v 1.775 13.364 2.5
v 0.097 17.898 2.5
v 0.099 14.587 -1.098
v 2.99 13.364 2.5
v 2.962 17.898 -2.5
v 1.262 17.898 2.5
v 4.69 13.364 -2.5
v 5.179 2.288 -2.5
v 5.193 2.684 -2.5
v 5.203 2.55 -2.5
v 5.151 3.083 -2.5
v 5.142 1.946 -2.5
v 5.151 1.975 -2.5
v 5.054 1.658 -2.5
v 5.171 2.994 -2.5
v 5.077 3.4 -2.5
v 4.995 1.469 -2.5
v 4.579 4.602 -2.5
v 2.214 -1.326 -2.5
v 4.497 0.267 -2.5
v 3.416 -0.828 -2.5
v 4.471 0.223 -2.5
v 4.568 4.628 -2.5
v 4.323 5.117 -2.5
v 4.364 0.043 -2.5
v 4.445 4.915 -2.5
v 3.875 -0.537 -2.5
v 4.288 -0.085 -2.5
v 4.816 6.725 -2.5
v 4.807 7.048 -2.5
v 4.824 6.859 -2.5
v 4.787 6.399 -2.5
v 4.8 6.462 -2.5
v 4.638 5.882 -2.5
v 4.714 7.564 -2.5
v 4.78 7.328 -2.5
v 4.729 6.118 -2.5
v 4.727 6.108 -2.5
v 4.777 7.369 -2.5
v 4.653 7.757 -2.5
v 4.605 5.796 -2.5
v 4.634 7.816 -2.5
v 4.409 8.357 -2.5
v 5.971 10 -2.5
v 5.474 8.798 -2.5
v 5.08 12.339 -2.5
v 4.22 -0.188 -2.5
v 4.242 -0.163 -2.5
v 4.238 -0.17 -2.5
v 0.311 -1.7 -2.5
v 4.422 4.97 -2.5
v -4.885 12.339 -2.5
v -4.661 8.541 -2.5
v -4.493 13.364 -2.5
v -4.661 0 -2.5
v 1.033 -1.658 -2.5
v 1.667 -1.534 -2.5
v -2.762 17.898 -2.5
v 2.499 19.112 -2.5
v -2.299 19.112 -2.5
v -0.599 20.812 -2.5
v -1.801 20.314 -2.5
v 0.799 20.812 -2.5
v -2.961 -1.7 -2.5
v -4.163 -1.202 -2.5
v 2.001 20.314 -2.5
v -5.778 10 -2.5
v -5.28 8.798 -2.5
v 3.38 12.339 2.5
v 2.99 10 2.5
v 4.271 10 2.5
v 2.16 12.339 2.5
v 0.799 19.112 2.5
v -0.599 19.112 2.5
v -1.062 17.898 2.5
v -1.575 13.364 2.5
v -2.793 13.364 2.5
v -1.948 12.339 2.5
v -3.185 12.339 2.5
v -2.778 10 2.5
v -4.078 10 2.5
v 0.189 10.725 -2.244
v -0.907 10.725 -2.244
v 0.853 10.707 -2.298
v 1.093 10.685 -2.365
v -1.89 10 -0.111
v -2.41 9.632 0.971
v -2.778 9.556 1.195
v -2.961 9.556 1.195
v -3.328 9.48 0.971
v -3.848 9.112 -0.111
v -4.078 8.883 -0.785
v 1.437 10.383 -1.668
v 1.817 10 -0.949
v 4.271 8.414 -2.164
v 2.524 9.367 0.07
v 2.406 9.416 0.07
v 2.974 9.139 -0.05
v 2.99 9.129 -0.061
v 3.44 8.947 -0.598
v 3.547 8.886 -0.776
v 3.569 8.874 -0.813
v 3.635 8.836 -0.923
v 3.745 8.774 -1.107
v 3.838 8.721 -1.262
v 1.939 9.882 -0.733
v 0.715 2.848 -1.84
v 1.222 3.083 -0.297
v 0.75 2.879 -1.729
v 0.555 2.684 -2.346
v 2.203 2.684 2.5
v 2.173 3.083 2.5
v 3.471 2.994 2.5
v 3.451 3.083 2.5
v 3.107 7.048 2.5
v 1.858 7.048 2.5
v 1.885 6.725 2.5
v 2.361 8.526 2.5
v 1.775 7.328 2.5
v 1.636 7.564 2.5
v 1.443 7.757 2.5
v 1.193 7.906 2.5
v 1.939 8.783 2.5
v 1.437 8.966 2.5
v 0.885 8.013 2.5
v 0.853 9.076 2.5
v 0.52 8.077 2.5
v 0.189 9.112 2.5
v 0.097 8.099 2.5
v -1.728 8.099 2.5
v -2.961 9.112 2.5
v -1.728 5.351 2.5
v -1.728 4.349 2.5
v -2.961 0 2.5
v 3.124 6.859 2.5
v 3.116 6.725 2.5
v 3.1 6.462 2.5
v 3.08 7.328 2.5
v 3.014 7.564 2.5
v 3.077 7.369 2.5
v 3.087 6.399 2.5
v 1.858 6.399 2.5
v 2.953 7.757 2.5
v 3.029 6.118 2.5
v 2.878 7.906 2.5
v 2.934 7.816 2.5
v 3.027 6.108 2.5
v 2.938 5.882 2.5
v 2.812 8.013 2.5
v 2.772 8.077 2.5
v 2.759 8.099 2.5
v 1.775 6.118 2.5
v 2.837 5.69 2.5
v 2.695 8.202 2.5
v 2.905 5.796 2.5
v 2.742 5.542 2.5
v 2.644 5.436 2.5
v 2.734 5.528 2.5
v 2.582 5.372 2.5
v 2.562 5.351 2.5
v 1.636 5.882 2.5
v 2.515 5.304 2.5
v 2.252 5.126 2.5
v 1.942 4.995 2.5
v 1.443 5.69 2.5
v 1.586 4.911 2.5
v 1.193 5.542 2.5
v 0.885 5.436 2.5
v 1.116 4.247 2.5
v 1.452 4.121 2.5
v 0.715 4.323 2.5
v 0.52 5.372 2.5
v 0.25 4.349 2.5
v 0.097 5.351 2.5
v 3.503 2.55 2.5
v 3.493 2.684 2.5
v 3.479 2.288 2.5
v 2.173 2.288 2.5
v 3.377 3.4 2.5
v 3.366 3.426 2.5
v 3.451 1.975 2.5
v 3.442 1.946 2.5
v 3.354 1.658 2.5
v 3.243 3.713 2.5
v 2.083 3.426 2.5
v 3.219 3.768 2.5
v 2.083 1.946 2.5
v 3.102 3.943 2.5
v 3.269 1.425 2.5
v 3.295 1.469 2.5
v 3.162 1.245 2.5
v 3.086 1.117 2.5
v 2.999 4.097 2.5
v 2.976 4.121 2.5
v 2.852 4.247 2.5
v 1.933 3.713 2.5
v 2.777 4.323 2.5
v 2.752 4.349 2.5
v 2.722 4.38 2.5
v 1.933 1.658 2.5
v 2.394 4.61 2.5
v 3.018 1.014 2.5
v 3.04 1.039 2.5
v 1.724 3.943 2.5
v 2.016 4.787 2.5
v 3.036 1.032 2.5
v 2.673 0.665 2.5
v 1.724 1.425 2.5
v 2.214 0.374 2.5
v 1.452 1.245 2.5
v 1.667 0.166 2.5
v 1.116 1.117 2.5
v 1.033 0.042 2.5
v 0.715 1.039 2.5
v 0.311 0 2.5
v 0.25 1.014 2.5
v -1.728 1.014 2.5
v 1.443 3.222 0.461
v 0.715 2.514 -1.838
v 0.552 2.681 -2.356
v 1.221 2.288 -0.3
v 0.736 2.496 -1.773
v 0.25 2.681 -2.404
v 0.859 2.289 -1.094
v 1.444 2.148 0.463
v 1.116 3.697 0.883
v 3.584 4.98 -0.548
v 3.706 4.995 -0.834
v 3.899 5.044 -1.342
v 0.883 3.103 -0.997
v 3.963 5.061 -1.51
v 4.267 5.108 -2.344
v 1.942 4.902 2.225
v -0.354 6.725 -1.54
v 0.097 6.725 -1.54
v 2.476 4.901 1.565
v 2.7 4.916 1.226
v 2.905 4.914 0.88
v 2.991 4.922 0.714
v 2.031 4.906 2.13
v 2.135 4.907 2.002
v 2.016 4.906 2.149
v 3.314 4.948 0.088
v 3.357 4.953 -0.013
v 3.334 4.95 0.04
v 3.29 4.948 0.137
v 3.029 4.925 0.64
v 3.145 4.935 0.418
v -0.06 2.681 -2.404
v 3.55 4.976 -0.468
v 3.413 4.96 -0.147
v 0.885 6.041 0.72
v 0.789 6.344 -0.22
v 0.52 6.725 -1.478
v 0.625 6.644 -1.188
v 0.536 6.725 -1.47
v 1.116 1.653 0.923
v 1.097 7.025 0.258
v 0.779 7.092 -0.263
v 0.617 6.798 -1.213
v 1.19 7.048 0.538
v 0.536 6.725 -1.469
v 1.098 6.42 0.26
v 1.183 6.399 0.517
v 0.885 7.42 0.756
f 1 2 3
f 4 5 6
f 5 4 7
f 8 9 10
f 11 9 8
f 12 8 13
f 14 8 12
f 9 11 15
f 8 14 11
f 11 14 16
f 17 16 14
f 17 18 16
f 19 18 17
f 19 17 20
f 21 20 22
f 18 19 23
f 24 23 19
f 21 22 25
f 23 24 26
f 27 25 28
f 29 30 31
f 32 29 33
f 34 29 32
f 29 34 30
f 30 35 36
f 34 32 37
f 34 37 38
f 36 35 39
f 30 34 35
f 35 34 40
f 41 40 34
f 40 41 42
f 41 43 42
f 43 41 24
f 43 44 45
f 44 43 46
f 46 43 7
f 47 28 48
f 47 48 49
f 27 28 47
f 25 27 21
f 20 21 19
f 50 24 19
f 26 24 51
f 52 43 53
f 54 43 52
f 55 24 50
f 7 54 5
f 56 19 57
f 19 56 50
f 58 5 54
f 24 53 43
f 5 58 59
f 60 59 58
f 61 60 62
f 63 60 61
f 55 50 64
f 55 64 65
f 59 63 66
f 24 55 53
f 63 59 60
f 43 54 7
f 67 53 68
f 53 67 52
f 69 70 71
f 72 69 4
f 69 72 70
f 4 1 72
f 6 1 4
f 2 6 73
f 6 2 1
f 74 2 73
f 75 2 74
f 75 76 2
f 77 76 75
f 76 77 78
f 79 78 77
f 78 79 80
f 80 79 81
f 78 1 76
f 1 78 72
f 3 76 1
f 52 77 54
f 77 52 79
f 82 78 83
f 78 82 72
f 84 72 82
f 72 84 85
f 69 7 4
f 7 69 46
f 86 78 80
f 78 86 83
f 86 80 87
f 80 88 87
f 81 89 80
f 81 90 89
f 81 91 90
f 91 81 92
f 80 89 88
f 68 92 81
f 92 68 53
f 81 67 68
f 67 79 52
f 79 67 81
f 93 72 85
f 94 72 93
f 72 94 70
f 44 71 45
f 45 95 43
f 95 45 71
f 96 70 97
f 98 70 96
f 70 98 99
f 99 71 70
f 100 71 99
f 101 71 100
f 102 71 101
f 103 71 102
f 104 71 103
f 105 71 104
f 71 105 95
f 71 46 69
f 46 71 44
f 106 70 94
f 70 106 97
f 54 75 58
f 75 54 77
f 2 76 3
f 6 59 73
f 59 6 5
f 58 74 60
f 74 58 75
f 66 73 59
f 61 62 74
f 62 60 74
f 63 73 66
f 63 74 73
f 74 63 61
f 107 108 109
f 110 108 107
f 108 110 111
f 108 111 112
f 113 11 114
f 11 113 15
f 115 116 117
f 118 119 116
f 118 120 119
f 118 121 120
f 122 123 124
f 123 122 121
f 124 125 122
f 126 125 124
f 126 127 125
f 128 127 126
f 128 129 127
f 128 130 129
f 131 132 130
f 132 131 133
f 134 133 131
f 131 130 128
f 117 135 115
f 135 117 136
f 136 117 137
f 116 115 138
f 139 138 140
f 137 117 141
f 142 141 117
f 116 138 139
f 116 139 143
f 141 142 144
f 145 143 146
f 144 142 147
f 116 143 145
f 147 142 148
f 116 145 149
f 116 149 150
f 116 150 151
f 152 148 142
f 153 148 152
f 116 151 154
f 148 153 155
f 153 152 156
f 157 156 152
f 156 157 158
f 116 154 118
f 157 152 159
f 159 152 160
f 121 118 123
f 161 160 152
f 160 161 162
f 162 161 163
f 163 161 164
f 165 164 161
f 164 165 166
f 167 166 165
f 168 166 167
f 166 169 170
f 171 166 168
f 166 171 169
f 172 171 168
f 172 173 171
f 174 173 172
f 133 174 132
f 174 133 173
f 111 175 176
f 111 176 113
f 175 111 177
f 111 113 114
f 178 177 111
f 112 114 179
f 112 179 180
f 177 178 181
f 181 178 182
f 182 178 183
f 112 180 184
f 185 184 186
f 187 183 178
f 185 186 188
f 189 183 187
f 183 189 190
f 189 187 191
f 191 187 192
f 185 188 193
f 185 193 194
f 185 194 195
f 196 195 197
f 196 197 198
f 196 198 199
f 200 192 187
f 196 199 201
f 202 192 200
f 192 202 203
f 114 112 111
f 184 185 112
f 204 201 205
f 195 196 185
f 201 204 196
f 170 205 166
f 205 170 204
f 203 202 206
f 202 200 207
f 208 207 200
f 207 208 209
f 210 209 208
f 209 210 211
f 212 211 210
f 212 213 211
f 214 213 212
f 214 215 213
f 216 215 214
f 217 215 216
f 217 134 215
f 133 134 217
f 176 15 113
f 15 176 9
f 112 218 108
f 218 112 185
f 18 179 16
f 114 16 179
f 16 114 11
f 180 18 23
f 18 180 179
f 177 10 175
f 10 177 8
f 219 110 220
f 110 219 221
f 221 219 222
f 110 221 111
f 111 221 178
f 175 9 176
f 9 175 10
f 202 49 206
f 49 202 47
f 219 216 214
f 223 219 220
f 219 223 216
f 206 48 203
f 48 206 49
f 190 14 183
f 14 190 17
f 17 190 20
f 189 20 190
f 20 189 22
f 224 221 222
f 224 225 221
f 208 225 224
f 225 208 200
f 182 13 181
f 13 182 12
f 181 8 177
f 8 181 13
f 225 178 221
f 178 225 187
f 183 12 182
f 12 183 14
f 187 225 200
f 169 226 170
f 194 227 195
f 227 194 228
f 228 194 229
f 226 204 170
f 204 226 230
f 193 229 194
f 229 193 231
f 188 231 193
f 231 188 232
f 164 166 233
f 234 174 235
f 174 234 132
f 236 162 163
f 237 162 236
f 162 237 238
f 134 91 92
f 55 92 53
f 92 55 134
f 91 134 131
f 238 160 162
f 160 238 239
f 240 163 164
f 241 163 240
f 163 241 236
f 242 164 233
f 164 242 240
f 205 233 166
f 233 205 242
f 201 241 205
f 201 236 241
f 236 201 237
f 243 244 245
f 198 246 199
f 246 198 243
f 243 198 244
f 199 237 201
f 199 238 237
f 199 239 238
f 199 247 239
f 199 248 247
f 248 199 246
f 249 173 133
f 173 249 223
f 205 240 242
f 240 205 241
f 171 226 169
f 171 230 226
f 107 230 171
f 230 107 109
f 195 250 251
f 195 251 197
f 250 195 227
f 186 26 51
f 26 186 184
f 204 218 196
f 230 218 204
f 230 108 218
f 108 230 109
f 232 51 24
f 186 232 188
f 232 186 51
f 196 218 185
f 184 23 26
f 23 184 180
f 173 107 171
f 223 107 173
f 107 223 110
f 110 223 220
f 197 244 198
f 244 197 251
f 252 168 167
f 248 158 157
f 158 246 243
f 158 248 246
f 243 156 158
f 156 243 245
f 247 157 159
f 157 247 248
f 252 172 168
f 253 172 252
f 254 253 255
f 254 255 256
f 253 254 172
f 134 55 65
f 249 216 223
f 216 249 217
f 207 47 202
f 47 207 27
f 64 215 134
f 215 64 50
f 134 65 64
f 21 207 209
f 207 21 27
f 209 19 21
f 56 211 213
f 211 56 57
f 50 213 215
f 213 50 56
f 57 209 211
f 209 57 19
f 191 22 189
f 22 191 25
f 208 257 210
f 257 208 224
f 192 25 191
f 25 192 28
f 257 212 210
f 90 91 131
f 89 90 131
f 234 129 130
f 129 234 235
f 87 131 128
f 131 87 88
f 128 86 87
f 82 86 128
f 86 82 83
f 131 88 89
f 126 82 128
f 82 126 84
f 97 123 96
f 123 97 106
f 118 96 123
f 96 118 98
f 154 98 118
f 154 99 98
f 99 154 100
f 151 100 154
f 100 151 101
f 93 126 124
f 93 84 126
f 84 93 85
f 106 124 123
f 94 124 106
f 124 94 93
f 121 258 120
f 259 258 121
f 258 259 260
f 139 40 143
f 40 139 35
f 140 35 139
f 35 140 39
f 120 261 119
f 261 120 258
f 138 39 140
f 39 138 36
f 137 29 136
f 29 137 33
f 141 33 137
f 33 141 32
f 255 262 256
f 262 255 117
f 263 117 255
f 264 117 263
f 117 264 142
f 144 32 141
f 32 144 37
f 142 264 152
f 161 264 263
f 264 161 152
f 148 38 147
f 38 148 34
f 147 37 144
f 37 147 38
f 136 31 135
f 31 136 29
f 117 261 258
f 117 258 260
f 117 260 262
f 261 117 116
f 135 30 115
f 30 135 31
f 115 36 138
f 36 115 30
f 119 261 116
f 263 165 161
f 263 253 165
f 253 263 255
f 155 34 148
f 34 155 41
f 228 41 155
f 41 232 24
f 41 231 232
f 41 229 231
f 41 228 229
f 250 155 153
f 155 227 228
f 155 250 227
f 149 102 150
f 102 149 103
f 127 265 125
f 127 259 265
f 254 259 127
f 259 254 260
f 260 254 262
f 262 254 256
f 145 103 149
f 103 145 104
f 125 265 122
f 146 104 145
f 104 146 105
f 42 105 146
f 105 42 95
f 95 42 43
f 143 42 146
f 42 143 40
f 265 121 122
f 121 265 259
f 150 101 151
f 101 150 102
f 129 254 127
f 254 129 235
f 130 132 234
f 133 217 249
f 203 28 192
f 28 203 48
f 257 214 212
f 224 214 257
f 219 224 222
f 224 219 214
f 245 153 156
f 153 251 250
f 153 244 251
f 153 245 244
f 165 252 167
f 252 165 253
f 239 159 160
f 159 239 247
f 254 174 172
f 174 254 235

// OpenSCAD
//Set the 1st textline to render
textstring1="A";

//Set the 2nd textline to render - or leave blank if only 1 line is needed
textstring2="B";

//Font name. In the list is first a selection of bold fonts. After the dashed line you get a list of thinner fonts, which are not really recommended.
fontname="Nova Mono"; //[Vivian,Holtwood One SC,Alegreya Sans SC Black,Alfa Slab One,Asset,Black Ops One,Bowlby One,Bowlby One SC,Chango,Cinzel Decorative Black,Coustard,Elsie Black,Elsie Swash Caps Black,Erica One,Exo2 Black,Fascinate,Lobster,PassionOne,Plaster,Poller One,Rammetto One,Ruslan Display,Sarpanch Black,Sigmar One,Sonsie One,Titan One,Ultra,Hanalei,---------,ABeeZee,Abel,Abril Fatface,Aclonica,Acme,Actor,Adamina,Advent Pro,Aguafina Script,Akronim,Aladin,Aldrich,Alef,Alex Brush,Alice,Alike,Alike Angular,Allan,Allerta,Allerta Stencil,Allura,Almendra,Almendra Display,Almendra SC,Amarante,Amaranth,Amatic SC,Amethysta,Amiri,Anaheim,Andada,Andika,Angkor,Annie Use Your Telescope,Anonymous Pro,Antic,Antic Didone,Antic Slab,Anton,Arapey,Arbutus,Arbutus Slab,Architects Daughter,Archivo Black,Archivo Narrow,Arimo,Arizonia,Armata,Artifika,Arvo,Asap,Asset,Astloch,Asul,Atomic Age,Aubrey,Audiowide,Autour One,Average,Average Sans,Averia Gruesa Libre,Averia Libre,Averia Sans Libre,Averia Serif Libre,Bad Script,Balthazar,Bangers,Basic,Battambang,Baumans,Bayon,Belgrano,Belleza,BenchNine,Bentham,Berkshire Swash,Bevan,Bigelow Rules,Bigshot One,Bilbo,Bilbo Swash Caps,Bitter,Black Ops One,Bokor,Bonbon,Boogaloo,Bowlby One,Bowlby One SC,Brawler,Bree Serif,Bubblegum Sans,Bubbler One,Buda,Buenard,Butcherman,Butterfly Kids,Cabin,Cabin Condensed,Cabin Sketch,Caesar Dressing,Cagliostro,Calligraffitti,Cambay,Cambo,Candal,Cantarell,Cantata One,Cantora One,Capriola,Cardo,Carme,Carrois Gothic,Carrois Gothic SC,Carter One,Caudex,Cedarville Cursive,Ceviche One,Changa One,Chango,Chau Philomene One,Chela One,Chelsea Market,Chenla,Cherry Cream Soda,Cherry Swash,Chewy,Chicle,Chivo,Cinzel,Cinzel Decorative,Clicker Script,Coda,Coda Caption,Codystar,Combo,Comfortaa,Coming Soon,Concert One,Condiment,Content,Contrail One,Convergence,Cookie,Copse,Corben,Courgette,Cousine,Coustard,Covered By Your Grace,Crafty Girls,Creepster,Crete Round,Crimson Text,Croissant One,Crushed,Cuprum,Cutive,Cutive Mono,Damion,Dancing Script,Dangrek,Dawning of a New Day,Days One,Dekko,Delius,Delius Swash Caps,Delius Unicase,Della Respira,Denk One,Devonshire,Dhurjati,Didact Gothic,Diplomata,Diplomata SC,Domine,Donegal One,Doppio One,Dorsa,Dosis,Dr Sugiyama,Droid Sans,Droid Sans Mono,Droid Serif,Duru Sans,Dynalight,Eagle Lake,Eater,EB Garamond,Economica,Ek Mukta,Electrolize,Elsie,Elsie Swash Caps,Emblema One,Emilys Candy,Engagement,Englebert,Enriqueta,Erica One,Esteban,Euphoria Script,Ewert,Exo,Exo 2,Expletus Sans,Fanwood Text,Fascinate,Fascinate Inline,Faster One,Fasthand,Fauna One,Federant,Federo,Felipa,Fenix,Finger Paint,Fira Mono,Fira Sans,Fjalla One,Fjord One,Flamenco,Flavors,Fondamento,Fontdiner Swanky,Forum,Francois One,Freckle Face,Fredericka the Great,Fredoka One,Freehand,Fresca,Frijole,Fruktur,Fugaz One,Gabriela,Gafata,Galdeano,Galindo,Gentium Basic,Gentium Book Basic,Geo,Geostar,Geostar Fill,Germania One,GFS Didot,GFS Neohellenic,Gidugu,Gilda Display,Give You Glory,Glass Antiqua,Glegoo,Gloria Hallelujah,Goblin One,Gochi Hand,Gorditas,Goudy Bookletter 1911,Graduate,Grand Hotel,Gravitas One,Great Vibes,Griffy,Gruppo,Gudea,Gurajada,Habibi,Halant,Hammersmith One,Hanalei,Hanalei Fill,Handlee,Hanuman,Happy Monkey,Headland One,Henny Penny,Herr Von Muellerhoff,Hind,Homemade Apple,Homenaje,Iceberg,Iceland,IM Fell Double Pica,IM Fell Double Pica SC,IM Fell DW Pica,IM Fell DW Pica SC,IM Fell English,IM Fell English SC,IM Fell French Canon,IM Fell French Canon SC,IM Fell Great Primer,IM Fell Great Primer SC,Imprima,Inconsolata,Inder,Indie Flower,Inika,Irish Grover,Istok Web,Italiana,Italianno,Jacques Francois,Jacques Francois Shadow,Jim Nightshade,Jockey One,Jolly Lodger,Josefin Sans,Josefin Slab,Joti One,Judson,Julee,Julius Sans One,Junge,Jura,Just Another Hand,Just Me Again Down Here,Kalam,Kameron,Kantumruy,Karla,Karma,Kaushan Script,Kavoon,Kdam Thmor,Keania One,Kelly Slab,Kenia,Khand,Khmer,Khula,Kite One,Knewave,Kotta One,Koulen,Kranky,Kreon,Kristi,Krona One,La Belle Aurore,Laila,Lakki Reddy,Lancelot,Lateef,Lato,League Script,Leckerli One,Ledger,Lekton,Lemon,Liberation Sans,Libre Baskerville,Life Savers,Lilita One,Lily Script One,Limelight,Linden Hill,Lobster,Lobster Two,Londrina Outline,Londrina Shadow,Londrina Sketch,Londrina Solid,Lora,Love Ya Like A Sister,Loved by the King,Lovers Quarrel,Luckiest Guy,Lusitana,Lustria,Macondo,Macondo Swash Caps,Magra,Maiden Orange,Mako,Mallanna,Mandali,Marcellus,Marcellus SC,Marck Script,Margarine,Marko One,Marmelad,Martel Sans,Marvel,Mate,Mate SC,Maven Pro,McLaren,Meddon,MedievalSharp,Medula One,Megrim,Meie Script,Merienda,Merienda One,Merriweather,Merriweather Sans,Metal,Metal Mania,Metamorphous,Metrophobic,Michroma,Milonga,Miltonian,Miltonian Tattoo,Miniver,Miss Fajardose,Modak,Modern Antiqua,Molengo,Molle,Monda,Monofett,Monoton,Monsieur La Doulaise,Montaga,Montez,Montserrat,Montserrat Alternates,Montserrat Subrayada,Moul,Moulpali,Mountains of Christmas,Mouse Memoirs,Mr Bedfort,Mr Dafoe,Mr De Haviland,Mrs Saint Delafield,Mrs Sheppards,Muli,Mystery Quest,Neucha,Neuton,New Rocker,News Cycle,Niconne,Nixie One,Nobile,Nokora,Norican,Nosifer,Nothing You Could Do,Noticia Text,Noto Sans,Noto Serif,Nova Cut,Nova Flat,Nova Mono,Nova Oval,Nova Round,Nova Script,Nova Slim,Nova Square,NTR,Numans,Nunito,Odor Mean Chey,Offside,Old Standard TT,Oldenburg,Oleo Script,Oleo Script Swash Caps,Open Sans,Open Sans Condensed,Oranienbaum,Orbitron,Oregano,Orienta,Original Surfer,Oswald,Over the Rainbow,Overlock,Overlock SC,Ovo,Oxygen,Oxygen Mono,Pacifico,Paprika,Parisienne,Passero One,Passion One,Pathway Gothic One,Patrick Hand,Patrick Hand SC,Patua One,Paytone One,Peddana,Peralta,Permanent Marker,Petit Formal Script,Petrona,Philosopher,Piedra,Pinyon Script,Pirata One,Plaster,Play,Playball,Playfair Display,Playfair Display SC,Podkova,Poiret One,Poller One,Poly,Pompiere,Pontano Sans,Port Lligat Sans,Port Lligat Slab,Prata,Preahvihear,Press Start 2P,Princess Sofia,Prociono,Prosto One,PT Mono,PT Sans,PT Sans Caption,PT Sans Narrow,PT Serif,PT Serif Caption,Puritan,Purple Purse,Quando,Quantico,Quattrocento,Quattrocento Sans,Questrial,Quicksand,Quintessential,Qwigley,Racing Sans One,Radley,Rajdhani,Raleway,Raleway Dots,Ramabhadra,Ramaraja,Rambla,Rammetto One,Ranchers,Rancho,Ranga,Rationale,Ravi Prakash,Redressed,Reenie Beanie,Revalia,Ribeye,Ribeye Marrow,Righteous,Risque,Roboto,Roboto Condensed,Roboto Slab,Rochester,Rock Salt,Rokkitt,Romanesco,Ropa Sans,Rosario,Rosarivo,Rouge Script,Rozha One,Rubik Mono One,Rubik One,Ruda,Rufina,Ruge Boogie,Ruluko,Rum Raisin,Ruslan Display,Russo One,Ruthie,Rye,Sacramento,Sail,Salsa,Sanchez,Sancreek,Sansita One,Sarina,Sarpanch,Satisfy,Scada,Scheherazade,Schoolbell,Seaweed Script,Sevillana,Seymour One,Shadows Into Light,Shadows Into Light Two,Shanti,Share,Share Tech,Share Tech Mono,Shojumaru,Short Stack,Siemreap,Sigmar One,Signika,Signika Negative,Simonetta,Sintony,Sirin Stencil,Six Caps,Skranji,Slabo 13px,Slabo 27px,Slackey,Smokum,Smythe,Sniglet,Snippet,Snowburst One,Sofadi One,Sofia,Sonsie One,Sorts Mill Goudy,Source Code Pro,Source Sans Pro,Source Serif Pro,Special Elite,Spicy Rice,Spinnaker,Spirax,Squada One,Sree Krushnadevaraya,Stalemate,Stalinist One,Stardos Stencil,Stint Ultra Condensed,Stint Ultra Expanded,Stoke,Strait,Sue Ellen Francisco,Sunshiney,Supermercado One,Suranna,Suravaram,Suwannaphum,Swanky and Moo Moo,Syncopate,Tangerine,Taprom,Tauri,Teko,Telex,Tenali Ramakrishna,Tenor Sans,Text Me One,The Girl Next Door,Tienne,Timmana,Tinos,Titan One,Titillium Web,Trade Winds,Trocchi,Trochut,Trykker,Tulpen One,Ubuntu,Ubuntu Condensed,Ubuntu Mono,Ultra,Uncial Antiqua,Underdog,Unica One,UnifrakturCook,UnifrakturMaguntia,Unkempt,Unlock,Unna,Vampiro One,Varela,Varela Round,Vast Shadow,Vesper Libre,Vibur,Vidaloka,Viga,Voces,Volkhov,Vollkorn,Voltaire,VT323,Waiting for the Sunrise,Wallpoet,Walter Turncoat,Warnes,Wellfleet,Wendy One,Wire One,Yanone Kaffeesatz,Yellowtail,Yeseva One,Yesteryear,Zeyada]

//type
//type="tag"; //[container, tag, hollow]

//scaling up
scale=1.7;

//Text height (extrusion) in mm
textheight=5;

//Set font size in mm
textsize=10; 

//line height in font size measured
lineheight=1.0;

/* [Hidden] */
//-------------------------------------------------------------------------------


/*
Chamfered Text 2
Version 3, September 2018
Written by MC Geisler (mcgenki at gmail dot com)

A text for your customization...
Have fun!

License: Attribution 4.0 International (CC BY 4.0)

You are free to:
    Share - copy and redistribute the material in any medium or format
    Adapt - remix, transform, and build upon the material
    for any purpose, even commercially.
*/

    
module writetext(textstr, sizeit)
{
    text(textstr,size=sizeit*.9,font=fontname,halign="center",valign="baseline");
}

module RiseText(textstr1, textstr2, textsize,textheight, scale) 
{ 
    minkowski()
    {
        union()
        {
            if (textstr1!="")
                translate([0,textsize*lineheight,0])
                    linear_extrude(height=.0001,convexity = 32)
                        writetext(textstr1, textsize);
            
            if (textstr2!="")
                linear_extrude(height=.0001,convexity = 32)
                    writetext(textstr2, textsize);
        }
        
        //rotate([0,180,0])
            cylinder(h=textheight, r1=scale, r2=0, center=true, $fn=8);
    }
}

//rotate([90,0,0])
    RiseText(textstring1,textstring2,textsize,textheight, scale);
